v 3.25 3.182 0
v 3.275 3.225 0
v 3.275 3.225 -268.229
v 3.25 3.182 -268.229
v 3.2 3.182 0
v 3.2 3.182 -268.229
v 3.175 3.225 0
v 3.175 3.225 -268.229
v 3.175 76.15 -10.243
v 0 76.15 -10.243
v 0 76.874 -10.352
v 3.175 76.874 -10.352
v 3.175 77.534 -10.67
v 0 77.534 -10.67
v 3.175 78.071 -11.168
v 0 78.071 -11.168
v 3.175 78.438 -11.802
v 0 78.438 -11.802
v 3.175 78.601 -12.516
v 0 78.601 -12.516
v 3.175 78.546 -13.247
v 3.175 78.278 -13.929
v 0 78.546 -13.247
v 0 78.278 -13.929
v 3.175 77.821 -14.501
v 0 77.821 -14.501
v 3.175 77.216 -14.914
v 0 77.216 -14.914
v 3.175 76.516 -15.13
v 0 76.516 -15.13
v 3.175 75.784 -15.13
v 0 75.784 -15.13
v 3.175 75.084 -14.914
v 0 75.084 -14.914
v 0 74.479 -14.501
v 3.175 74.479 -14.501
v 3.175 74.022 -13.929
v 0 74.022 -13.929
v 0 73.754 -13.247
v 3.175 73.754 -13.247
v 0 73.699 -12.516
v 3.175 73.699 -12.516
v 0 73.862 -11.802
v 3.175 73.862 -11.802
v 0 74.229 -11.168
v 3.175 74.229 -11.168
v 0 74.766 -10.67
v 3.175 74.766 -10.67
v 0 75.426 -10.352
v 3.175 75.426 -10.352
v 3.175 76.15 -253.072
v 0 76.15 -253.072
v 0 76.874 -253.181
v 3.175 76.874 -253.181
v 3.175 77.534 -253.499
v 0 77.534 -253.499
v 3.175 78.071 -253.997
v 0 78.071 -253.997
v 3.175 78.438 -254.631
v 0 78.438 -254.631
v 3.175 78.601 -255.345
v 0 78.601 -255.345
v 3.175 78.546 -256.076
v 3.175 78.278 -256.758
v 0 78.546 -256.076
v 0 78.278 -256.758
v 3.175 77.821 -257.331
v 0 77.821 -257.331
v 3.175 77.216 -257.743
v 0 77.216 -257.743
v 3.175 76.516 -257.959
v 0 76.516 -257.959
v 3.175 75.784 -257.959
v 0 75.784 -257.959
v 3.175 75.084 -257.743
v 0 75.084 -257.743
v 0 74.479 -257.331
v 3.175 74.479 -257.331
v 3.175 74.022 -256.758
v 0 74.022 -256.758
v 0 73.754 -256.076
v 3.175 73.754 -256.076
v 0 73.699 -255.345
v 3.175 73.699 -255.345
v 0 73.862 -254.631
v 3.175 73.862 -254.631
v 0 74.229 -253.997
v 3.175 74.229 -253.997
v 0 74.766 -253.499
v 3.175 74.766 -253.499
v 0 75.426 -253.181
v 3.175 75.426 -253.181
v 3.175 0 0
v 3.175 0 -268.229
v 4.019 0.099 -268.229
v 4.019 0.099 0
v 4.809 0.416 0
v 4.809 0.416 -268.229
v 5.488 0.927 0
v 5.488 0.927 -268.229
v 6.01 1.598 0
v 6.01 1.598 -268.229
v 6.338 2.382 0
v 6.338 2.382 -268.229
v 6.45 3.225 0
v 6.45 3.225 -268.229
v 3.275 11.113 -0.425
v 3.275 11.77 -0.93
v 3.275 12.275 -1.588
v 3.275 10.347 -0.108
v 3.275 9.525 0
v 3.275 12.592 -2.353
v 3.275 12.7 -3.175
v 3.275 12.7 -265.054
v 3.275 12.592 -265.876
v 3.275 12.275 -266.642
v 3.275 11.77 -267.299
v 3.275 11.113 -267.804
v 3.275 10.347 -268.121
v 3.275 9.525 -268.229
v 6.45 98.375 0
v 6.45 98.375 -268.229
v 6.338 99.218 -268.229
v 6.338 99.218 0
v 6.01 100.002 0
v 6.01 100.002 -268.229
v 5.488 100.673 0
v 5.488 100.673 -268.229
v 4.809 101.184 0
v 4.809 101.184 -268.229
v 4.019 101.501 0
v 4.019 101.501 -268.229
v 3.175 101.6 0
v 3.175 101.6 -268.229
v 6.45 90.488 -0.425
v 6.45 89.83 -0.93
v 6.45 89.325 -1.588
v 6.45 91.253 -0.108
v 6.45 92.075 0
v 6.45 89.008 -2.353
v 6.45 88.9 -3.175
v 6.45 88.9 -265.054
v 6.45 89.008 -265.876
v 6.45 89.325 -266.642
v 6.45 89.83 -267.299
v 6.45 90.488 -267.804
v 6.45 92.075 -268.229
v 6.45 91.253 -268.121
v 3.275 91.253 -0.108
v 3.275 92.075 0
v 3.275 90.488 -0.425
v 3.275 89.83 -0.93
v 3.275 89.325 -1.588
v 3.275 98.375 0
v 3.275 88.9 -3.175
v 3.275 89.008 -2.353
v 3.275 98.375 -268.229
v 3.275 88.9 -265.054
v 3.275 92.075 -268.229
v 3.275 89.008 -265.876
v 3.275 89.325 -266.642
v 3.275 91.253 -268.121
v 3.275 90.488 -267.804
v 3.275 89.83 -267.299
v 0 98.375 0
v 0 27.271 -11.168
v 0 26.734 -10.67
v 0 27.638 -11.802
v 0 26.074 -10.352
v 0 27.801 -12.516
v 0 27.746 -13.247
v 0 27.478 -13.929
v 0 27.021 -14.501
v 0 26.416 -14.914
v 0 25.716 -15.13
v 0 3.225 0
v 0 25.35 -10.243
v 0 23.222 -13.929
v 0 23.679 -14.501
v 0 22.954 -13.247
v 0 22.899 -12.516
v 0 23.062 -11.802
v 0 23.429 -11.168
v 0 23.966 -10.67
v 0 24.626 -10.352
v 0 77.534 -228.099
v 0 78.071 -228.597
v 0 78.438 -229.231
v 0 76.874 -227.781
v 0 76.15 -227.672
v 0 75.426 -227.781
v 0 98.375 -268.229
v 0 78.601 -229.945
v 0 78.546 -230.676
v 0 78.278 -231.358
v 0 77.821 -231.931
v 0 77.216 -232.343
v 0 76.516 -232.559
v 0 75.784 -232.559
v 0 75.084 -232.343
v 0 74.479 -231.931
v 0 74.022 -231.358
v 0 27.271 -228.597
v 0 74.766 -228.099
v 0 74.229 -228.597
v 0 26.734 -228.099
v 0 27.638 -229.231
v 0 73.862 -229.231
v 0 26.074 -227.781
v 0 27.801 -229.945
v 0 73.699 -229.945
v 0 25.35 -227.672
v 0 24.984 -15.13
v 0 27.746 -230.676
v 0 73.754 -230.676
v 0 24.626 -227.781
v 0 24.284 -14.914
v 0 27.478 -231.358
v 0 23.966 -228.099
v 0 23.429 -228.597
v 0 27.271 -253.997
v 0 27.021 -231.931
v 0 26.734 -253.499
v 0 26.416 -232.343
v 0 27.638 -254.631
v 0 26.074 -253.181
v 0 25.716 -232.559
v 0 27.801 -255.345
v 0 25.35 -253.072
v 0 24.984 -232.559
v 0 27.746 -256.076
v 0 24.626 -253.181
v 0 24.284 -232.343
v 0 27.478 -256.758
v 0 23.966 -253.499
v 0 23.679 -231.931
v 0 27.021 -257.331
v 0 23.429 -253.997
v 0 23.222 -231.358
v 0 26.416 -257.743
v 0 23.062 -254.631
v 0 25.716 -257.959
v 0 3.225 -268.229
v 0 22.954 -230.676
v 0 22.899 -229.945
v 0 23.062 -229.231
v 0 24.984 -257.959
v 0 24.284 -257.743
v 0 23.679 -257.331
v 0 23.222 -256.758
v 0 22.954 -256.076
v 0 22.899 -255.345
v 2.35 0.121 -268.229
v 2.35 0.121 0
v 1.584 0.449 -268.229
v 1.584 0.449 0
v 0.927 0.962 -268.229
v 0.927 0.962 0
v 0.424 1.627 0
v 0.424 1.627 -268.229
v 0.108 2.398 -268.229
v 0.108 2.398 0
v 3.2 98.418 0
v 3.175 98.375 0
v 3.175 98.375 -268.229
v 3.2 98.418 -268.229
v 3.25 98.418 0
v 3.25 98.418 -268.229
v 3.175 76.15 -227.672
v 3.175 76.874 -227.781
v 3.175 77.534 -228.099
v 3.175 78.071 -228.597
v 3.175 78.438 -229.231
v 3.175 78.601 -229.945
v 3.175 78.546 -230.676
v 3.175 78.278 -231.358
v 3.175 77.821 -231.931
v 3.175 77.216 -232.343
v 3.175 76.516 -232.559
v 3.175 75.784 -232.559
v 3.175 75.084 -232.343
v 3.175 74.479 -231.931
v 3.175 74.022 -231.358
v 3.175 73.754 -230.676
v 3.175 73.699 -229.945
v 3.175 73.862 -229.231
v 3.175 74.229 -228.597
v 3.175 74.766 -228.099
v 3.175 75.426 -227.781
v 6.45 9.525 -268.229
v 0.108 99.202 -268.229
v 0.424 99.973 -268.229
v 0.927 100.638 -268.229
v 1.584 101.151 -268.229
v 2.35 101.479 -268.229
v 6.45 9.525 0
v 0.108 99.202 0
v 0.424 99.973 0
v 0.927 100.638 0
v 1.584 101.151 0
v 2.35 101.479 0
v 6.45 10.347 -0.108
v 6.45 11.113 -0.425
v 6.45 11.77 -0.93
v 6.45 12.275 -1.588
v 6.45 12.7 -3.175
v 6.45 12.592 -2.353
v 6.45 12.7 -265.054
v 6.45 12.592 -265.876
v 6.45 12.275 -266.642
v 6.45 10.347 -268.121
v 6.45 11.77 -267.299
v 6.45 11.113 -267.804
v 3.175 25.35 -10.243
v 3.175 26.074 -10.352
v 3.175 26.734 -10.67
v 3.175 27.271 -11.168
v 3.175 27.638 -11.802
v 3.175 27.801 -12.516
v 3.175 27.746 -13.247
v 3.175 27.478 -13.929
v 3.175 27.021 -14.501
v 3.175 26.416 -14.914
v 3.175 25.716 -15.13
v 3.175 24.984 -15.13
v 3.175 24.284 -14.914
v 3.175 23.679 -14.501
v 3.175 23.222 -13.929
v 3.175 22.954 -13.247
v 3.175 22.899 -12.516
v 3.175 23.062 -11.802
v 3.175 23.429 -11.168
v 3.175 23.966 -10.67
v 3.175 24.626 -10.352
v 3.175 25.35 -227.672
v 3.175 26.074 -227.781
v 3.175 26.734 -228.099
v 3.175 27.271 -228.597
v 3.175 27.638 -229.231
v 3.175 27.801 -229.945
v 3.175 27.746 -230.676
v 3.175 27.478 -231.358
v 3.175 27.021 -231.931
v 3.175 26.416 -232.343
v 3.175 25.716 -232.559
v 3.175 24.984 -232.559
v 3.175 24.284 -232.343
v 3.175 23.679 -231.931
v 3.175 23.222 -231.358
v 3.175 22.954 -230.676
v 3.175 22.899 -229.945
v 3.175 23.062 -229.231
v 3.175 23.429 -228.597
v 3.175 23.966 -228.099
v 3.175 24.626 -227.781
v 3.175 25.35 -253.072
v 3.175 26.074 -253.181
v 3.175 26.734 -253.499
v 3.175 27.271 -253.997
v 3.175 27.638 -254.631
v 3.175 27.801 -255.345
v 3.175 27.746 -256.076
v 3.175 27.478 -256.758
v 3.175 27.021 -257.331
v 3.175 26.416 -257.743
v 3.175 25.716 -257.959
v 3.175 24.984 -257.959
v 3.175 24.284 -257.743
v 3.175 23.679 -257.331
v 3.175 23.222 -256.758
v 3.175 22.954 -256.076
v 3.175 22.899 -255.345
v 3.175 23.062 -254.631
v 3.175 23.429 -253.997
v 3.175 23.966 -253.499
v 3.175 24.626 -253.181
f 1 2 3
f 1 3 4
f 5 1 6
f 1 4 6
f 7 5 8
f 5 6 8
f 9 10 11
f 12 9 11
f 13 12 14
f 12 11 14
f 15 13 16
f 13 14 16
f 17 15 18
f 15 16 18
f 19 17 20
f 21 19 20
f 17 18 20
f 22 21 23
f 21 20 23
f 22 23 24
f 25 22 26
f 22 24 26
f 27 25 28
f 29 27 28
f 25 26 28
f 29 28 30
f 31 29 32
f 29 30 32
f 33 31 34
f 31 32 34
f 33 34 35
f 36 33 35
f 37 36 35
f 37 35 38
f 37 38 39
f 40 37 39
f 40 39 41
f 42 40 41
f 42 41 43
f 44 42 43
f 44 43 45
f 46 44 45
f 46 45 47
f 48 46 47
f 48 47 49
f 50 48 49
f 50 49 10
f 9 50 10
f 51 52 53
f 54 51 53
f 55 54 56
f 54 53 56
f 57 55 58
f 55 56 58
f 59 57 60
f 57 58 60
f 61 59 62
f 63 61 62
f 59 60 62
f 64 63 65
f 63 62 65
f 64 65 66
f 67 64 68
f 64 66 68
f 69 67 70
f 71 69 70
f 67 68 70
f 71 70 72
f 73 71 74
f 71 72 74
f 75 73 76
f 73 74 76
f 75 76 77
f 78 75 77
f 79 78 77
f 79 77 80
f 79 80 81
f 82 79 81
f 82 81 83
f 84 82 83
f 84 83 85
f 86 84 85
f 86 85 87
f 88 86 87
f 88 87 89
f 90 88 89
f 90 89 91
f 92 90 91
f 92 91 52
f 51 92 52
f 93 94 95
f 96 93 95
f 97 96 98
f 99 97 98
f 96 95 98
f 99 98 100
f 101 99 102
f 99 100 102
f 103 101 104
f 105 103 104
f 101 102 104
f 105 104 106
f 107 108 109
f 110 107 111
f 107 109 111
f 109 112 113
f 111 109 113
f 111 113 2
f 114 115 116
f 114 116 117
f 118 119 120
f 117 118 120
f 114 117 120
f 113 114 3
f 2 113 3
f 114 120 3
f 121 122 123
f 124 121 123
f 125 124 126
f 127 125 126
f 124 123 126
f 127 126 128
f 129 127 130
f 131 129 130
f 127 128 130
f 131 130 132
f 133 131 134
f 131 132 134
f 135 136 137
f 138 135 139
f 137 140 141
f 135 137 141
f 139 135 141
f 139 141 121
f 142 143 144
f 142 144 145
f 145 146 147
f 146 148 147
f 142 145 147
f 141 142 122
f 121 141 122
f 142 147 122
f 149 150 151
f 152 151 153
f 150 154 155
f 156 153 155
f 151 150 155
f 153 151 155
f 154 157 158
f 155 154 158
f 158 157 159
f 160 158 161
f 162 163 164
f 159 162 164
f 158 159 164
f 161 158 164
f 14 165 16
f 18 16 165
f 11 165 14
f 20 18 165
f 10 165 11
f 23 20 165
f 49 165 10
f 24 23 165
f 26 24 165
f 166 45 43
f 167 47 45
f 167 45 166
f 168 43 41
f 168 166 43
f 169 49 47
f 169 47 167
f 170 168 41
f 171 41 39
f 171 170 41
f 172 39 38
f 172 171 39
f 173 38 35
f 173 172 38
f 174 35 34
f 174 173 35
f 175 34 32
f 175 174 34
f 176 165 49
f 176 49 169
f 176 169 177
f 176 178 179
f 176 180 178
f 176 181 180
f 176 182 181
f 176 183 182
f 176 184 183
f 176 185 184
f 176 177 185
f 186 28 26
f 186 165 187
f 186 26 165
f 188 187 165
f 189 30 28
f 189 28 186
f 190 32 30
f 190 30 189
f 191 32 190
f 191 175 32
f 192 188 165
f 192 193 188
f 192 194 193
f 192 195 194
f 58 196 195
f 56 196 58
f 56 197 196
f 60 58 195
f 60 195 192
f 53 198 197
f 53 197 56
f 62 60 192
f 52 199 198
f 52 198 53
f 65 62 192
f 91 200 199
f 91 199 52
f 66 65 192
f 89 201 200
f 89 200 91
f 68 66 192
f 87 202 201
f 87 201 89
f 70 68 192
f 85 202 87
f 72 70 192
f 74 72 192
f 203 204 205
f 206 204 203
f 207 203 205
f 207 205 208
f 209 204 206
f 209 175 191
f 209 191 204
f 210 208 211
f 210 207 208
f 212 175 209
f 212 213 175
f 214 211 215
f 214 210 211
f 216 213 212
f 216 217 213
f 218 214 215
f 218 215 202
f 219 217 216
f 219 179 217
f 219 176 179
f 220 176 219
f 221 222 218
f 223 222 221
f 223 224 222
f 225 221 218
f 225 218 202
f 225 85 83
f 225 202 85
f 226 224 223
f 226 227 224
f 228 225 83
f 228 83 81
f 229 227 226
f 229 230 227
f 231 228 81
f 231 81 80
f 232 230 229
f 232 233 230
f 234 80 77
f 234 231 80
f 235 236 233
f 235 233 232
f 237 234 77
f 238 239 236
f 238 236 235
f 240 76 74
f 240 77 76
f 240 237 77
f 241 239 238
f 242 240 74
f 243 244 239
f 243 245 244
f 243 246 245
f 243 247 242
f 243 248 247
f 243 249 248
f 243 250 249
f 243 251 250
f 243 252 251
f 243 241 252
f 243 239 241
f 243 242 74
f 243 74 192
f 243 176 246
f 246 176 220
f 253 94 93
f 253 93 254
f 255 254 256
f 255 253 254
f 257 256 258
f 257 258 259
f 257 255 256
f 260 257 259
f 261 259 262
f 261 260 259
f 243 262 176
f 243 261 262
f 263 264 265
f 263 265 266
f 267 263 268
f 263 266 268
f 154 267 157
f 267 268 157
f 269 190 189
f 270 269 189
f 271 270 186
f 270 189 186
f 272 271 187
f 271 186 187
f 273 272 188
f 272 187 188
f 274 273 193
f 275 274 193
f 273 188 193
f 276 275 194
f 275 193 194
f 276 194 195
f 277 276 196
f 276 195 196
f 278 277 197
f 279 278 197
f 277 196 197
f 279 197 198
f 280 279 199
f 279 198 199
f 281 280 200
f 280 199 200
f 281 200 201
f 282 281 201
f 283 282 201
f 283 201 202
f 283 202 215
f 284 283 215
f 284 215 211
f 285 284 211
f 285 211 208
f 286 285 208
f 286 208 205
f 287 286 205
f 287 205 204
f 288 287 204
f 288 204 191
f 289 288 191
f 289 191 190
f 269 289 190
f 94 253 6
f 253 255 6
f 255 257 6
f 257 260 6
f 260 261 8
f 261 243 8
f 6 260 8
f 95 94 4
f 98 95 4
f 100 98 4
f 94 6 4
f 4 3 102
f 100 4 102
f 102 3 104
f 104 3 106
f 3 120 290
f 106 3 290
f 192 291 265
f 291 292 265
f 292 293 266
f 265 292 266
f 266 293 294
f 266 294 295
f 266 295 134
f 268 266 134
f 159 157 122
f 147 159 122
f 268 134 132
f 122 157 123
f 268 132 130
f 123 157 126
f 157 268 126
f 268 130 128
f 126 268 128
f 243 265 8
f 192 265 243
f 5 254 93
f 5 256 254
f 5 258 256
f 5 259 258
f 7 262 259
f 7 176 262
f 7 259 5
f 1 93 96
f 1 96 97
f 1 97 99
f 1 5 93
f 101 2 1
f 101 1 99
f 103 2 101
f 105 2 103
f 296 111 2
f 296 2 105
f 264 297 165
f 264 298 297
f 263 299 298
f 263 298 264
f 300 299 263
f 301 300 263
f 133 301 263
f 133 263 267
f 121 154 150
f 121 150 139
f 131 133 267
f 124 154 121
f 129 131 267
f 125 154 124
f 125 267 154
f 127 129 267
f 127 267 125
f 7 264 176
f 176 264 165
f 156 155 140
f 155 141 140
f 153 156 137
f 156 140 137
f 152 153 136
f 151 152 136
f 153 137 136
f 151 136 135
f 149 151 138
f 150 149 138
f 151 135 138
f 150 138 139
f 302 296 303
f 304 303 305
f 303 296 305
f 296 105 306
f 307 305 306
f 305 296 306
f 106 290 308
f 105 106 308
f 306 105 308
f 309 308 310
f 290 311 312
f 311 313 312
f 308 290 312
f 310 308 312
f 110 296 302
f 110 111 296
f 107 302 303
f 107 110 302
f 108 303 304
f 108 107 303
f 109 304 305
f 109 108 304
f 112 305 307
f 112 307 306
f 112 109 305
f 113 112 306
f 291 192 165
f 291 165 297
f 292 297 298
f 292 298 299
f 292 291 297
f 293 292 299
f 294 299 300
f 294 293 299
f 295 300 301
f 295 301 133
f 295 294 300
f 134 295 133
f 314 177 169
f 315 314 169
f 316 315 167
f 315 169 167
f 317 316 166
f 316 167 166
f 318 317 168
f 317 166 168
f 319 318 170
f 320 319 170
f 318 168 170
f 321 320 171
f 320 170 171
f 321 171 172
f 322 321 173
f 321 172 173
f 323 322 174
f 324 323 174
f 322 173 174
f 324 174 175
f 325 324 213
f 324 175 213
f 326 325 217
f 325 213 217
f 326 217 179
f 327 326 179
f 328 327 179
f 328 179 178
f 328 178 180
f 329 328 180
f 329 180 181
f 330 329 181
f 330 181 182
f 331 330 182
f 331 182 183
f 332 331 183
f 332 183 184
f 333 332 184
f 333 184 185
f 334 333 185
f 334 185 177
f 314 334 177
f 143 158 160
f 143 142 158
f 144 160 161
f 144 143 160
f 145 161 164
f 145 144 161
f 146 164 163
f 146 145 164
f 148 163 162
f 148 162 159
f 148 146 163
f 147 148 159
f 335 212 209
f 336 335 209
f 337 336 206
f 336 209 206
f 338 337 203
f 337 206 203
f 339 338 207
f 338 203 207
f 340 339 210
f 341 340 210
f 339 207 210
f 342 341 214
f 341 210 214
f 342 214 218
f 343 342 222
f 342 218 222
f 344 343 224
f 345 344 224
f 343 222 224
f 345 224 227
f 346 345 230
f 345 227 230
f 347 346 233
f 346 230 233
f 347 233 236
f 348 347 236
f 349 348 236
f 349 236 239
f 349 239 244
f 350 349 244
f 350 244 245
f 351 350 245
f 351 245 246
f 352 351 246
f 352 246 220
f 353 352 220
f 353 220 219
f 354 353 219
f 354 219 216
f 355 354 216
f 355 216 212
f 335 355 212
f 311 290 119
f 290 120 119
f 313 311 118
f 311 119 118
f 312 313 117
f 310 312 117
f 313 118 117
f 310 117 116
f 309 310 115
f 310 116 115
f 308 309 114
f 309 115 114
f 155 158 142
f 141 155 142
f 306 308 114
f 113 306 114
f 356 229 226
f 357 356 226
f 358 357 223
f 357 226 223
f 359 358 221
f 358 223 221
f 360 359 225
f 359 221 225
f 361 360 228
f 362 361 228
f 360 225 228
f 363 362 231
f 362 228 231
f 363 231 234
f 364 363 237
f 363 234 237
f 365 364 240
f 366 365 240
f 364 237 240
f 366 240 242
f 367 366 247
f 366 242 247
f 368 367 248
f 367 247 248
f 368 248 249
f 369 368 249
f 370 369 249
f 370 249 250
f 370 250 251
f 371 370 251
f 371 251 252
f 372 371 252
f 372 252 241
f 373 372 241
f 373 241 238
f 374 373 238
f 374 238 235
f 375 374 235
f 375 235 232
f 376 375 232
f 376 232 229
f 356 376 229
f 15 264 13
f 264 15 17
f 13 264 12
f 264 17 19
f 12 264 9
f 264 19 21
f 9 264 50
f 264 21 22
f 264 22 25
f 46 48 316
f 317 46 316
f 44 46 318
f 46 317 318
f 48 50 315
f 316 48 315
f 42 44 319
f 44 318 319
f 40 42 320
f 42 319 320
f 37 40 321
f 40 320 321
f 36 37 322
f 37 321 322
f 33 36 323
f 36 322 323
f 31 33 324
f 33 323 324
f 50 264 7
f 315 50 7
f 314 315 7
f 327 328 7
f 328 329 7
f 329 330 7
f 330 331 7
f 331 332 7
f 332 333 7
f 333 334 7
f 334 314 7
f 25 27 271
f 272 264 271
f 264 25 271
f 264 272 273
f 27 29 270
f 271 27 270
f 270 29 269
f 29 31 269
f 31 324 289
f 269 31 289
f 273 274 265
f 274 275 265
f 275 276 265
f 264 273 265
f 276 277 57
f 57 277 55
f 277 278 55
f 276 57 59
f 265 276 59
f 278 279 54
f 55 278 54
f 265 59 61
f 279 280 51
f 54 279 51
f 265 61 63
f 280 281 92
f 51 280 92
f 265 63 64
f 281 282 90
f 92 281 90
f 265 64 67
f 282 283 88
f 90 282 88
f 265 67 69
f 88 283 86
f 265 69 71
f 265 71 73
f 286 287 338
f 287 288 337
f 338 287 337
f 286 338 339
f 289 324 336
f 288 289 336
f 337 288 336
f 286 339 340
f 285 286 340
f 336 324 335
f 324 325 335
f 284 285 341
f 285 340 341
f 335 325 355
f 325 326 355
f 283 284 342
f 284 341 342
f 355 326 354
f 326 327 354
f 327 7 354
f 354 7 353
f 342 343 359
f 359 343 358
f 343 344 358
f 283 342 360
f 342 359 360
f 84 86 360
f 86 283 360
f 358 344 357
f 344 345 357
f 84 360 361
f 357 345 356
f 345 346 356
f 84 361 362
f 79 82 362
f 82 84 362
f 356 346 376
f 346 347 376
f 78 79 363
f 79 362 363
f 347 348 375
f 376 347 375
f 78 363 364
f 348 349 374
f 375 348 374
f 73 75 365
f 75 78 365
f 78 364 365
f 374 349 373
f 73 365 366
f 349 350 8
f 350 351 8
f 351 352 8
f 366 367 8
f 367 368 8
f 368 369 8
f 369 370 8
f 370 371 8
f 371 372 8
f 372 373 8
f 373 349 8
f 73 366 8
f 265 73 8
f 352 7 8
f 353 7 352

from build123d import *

# Parameters (mm, degrees)
SKETCH1_W          = 3.175
SKETCH1_H          = 268.22908
BASE_FLANGE1_DEPTH = 101.6
HEM1_START         = -268.22908
HEM1_DEPTH         = 268.22908
HEM1_2_DEPTH       = 268.22908
SKETCH10_R         = 2.45745
CUT_EXTRUDE1_DEPTH = 287.898940147
FILLET1_R          = 3.175


# Read off the part's stored shape, not the designer's step: Hem1
# Sheet-metal steps are written as plain solids
with BuildPart() as part:
    # Sketch1 → Base-Flange1 (new body)
    with BuildSketch(Plane(origin=(0, 0, 0), x_dir=(1, 0, 0), z_dir=(0, 1, 0))):
        with Locations((1.5875, 134.11454)):
            Rectangle(SKETCH1_W, SKETCH1_H)
    extrude(amount=BASE_FLANGE1_DEPTH)

    # Hem1 outline → Hem1 (cut)
    with BuildSketch(Plane.XY.offset(HEM1_START)):
        with BuildLine():
            ThreePointArc((0, 98.375), (0.926970953, 100.637672645), (3.175, 101.59961238))
            Line((3.175, 101.59961238), (3.175, 101.6))
            Line((3.175, 101.6), (0, 101.6))
            Line((0, 101.6), (0, 98.375))
        make_face()
        with BuildLine():
            ThreePointArc((3.175, 0.00038762), (0.926970953, 0.962327355), (0, 3.225))
            Line((0, 3.225), (0, 0))
            Line((0, 0), (3.175, 0))
            Line((3.175, 0), (3.175, 0.00038762))
        make_face()
    extrude(amount=HEM1_DEPTH, mode=Mode.SUBTRACT)

    # Hem1 2 outline → Hem1 2 (add)
    with BuildSketch(Plane.XY.offset(HEM1_START)):
        with BuildLine():
            Line((3.275, 88.9), (6.45, 88.9))
            Line((6.45, 88.9), (6.45, 98.375))
            ThreePointArc((6.45, 98.375), (5.487672645, 100.673029047), (3.175, 101.59961238))
            Line((3.175, 101.59961238), (3.175, 98.375))
            ThreePointArc((3.175, 98.375), (3.225, 98.425), (3.275, 98.375))
            Line((3.275, 98.375), (3.275, 88.9))
        make_face()
        with BuildLine():
            ThreePointArc((3.275, 3.225), (3.225, 3.175), (3.175, 3.225))
            Line((3.175, 3.225), (3.175, 0.00038762))
            ThreePointArc((3.175, 0.00038762), (5.487672645, 0.926970953), (6.45, 3.225))
            Line((6.45, 3.225), (6.45, 12.7))
            Line((6.45, 12.7), (3.275, 12.7))
            Line((3.275, 12.7), (3.275, 3.225))
        make_face()
    extrude(amount=HEM1_2_DEPTH)

    # Sketch10 → Cut-Extrude1 (cut, through all)
    with BuildSketch(Plane.ZY):
        with Locations((-255.52908, 76.15)):
            Circle(SKETCH10_R)
        with Locations((-255.52908, 25.35)):
            Circle(SKETCH10_R)
        with Locations((-230.12908, 25.35)):
            Circle(SKETCH10_R)
        with Locations((-230.12908, 76.15)):
            Circle(SKETCH10_R)
        with Locations((-12.7, 76.15)):
            Circle(SKETCH10_R)
        with Locations((-12.7, 25.35)):
            Circle(SKETCH10_R)
    extrude(amount=-CUT_EXTRUDE1_DEPTH, mode=Mode.SUBTRACT)

    # Fillet1
    fillet1_edges = [part.edges().sort_by_distance(p)[0] for p in [
        (4.8625, 88.9, 0),
        (4.8625, 88.9, -268.22908),
        (4.8625, 12.7, -268.22908),
        (4.8625, 12.7, 0),
    ]]
    fillet(fillet1_edges, radius=FILLET1_R)


solid = part.part
